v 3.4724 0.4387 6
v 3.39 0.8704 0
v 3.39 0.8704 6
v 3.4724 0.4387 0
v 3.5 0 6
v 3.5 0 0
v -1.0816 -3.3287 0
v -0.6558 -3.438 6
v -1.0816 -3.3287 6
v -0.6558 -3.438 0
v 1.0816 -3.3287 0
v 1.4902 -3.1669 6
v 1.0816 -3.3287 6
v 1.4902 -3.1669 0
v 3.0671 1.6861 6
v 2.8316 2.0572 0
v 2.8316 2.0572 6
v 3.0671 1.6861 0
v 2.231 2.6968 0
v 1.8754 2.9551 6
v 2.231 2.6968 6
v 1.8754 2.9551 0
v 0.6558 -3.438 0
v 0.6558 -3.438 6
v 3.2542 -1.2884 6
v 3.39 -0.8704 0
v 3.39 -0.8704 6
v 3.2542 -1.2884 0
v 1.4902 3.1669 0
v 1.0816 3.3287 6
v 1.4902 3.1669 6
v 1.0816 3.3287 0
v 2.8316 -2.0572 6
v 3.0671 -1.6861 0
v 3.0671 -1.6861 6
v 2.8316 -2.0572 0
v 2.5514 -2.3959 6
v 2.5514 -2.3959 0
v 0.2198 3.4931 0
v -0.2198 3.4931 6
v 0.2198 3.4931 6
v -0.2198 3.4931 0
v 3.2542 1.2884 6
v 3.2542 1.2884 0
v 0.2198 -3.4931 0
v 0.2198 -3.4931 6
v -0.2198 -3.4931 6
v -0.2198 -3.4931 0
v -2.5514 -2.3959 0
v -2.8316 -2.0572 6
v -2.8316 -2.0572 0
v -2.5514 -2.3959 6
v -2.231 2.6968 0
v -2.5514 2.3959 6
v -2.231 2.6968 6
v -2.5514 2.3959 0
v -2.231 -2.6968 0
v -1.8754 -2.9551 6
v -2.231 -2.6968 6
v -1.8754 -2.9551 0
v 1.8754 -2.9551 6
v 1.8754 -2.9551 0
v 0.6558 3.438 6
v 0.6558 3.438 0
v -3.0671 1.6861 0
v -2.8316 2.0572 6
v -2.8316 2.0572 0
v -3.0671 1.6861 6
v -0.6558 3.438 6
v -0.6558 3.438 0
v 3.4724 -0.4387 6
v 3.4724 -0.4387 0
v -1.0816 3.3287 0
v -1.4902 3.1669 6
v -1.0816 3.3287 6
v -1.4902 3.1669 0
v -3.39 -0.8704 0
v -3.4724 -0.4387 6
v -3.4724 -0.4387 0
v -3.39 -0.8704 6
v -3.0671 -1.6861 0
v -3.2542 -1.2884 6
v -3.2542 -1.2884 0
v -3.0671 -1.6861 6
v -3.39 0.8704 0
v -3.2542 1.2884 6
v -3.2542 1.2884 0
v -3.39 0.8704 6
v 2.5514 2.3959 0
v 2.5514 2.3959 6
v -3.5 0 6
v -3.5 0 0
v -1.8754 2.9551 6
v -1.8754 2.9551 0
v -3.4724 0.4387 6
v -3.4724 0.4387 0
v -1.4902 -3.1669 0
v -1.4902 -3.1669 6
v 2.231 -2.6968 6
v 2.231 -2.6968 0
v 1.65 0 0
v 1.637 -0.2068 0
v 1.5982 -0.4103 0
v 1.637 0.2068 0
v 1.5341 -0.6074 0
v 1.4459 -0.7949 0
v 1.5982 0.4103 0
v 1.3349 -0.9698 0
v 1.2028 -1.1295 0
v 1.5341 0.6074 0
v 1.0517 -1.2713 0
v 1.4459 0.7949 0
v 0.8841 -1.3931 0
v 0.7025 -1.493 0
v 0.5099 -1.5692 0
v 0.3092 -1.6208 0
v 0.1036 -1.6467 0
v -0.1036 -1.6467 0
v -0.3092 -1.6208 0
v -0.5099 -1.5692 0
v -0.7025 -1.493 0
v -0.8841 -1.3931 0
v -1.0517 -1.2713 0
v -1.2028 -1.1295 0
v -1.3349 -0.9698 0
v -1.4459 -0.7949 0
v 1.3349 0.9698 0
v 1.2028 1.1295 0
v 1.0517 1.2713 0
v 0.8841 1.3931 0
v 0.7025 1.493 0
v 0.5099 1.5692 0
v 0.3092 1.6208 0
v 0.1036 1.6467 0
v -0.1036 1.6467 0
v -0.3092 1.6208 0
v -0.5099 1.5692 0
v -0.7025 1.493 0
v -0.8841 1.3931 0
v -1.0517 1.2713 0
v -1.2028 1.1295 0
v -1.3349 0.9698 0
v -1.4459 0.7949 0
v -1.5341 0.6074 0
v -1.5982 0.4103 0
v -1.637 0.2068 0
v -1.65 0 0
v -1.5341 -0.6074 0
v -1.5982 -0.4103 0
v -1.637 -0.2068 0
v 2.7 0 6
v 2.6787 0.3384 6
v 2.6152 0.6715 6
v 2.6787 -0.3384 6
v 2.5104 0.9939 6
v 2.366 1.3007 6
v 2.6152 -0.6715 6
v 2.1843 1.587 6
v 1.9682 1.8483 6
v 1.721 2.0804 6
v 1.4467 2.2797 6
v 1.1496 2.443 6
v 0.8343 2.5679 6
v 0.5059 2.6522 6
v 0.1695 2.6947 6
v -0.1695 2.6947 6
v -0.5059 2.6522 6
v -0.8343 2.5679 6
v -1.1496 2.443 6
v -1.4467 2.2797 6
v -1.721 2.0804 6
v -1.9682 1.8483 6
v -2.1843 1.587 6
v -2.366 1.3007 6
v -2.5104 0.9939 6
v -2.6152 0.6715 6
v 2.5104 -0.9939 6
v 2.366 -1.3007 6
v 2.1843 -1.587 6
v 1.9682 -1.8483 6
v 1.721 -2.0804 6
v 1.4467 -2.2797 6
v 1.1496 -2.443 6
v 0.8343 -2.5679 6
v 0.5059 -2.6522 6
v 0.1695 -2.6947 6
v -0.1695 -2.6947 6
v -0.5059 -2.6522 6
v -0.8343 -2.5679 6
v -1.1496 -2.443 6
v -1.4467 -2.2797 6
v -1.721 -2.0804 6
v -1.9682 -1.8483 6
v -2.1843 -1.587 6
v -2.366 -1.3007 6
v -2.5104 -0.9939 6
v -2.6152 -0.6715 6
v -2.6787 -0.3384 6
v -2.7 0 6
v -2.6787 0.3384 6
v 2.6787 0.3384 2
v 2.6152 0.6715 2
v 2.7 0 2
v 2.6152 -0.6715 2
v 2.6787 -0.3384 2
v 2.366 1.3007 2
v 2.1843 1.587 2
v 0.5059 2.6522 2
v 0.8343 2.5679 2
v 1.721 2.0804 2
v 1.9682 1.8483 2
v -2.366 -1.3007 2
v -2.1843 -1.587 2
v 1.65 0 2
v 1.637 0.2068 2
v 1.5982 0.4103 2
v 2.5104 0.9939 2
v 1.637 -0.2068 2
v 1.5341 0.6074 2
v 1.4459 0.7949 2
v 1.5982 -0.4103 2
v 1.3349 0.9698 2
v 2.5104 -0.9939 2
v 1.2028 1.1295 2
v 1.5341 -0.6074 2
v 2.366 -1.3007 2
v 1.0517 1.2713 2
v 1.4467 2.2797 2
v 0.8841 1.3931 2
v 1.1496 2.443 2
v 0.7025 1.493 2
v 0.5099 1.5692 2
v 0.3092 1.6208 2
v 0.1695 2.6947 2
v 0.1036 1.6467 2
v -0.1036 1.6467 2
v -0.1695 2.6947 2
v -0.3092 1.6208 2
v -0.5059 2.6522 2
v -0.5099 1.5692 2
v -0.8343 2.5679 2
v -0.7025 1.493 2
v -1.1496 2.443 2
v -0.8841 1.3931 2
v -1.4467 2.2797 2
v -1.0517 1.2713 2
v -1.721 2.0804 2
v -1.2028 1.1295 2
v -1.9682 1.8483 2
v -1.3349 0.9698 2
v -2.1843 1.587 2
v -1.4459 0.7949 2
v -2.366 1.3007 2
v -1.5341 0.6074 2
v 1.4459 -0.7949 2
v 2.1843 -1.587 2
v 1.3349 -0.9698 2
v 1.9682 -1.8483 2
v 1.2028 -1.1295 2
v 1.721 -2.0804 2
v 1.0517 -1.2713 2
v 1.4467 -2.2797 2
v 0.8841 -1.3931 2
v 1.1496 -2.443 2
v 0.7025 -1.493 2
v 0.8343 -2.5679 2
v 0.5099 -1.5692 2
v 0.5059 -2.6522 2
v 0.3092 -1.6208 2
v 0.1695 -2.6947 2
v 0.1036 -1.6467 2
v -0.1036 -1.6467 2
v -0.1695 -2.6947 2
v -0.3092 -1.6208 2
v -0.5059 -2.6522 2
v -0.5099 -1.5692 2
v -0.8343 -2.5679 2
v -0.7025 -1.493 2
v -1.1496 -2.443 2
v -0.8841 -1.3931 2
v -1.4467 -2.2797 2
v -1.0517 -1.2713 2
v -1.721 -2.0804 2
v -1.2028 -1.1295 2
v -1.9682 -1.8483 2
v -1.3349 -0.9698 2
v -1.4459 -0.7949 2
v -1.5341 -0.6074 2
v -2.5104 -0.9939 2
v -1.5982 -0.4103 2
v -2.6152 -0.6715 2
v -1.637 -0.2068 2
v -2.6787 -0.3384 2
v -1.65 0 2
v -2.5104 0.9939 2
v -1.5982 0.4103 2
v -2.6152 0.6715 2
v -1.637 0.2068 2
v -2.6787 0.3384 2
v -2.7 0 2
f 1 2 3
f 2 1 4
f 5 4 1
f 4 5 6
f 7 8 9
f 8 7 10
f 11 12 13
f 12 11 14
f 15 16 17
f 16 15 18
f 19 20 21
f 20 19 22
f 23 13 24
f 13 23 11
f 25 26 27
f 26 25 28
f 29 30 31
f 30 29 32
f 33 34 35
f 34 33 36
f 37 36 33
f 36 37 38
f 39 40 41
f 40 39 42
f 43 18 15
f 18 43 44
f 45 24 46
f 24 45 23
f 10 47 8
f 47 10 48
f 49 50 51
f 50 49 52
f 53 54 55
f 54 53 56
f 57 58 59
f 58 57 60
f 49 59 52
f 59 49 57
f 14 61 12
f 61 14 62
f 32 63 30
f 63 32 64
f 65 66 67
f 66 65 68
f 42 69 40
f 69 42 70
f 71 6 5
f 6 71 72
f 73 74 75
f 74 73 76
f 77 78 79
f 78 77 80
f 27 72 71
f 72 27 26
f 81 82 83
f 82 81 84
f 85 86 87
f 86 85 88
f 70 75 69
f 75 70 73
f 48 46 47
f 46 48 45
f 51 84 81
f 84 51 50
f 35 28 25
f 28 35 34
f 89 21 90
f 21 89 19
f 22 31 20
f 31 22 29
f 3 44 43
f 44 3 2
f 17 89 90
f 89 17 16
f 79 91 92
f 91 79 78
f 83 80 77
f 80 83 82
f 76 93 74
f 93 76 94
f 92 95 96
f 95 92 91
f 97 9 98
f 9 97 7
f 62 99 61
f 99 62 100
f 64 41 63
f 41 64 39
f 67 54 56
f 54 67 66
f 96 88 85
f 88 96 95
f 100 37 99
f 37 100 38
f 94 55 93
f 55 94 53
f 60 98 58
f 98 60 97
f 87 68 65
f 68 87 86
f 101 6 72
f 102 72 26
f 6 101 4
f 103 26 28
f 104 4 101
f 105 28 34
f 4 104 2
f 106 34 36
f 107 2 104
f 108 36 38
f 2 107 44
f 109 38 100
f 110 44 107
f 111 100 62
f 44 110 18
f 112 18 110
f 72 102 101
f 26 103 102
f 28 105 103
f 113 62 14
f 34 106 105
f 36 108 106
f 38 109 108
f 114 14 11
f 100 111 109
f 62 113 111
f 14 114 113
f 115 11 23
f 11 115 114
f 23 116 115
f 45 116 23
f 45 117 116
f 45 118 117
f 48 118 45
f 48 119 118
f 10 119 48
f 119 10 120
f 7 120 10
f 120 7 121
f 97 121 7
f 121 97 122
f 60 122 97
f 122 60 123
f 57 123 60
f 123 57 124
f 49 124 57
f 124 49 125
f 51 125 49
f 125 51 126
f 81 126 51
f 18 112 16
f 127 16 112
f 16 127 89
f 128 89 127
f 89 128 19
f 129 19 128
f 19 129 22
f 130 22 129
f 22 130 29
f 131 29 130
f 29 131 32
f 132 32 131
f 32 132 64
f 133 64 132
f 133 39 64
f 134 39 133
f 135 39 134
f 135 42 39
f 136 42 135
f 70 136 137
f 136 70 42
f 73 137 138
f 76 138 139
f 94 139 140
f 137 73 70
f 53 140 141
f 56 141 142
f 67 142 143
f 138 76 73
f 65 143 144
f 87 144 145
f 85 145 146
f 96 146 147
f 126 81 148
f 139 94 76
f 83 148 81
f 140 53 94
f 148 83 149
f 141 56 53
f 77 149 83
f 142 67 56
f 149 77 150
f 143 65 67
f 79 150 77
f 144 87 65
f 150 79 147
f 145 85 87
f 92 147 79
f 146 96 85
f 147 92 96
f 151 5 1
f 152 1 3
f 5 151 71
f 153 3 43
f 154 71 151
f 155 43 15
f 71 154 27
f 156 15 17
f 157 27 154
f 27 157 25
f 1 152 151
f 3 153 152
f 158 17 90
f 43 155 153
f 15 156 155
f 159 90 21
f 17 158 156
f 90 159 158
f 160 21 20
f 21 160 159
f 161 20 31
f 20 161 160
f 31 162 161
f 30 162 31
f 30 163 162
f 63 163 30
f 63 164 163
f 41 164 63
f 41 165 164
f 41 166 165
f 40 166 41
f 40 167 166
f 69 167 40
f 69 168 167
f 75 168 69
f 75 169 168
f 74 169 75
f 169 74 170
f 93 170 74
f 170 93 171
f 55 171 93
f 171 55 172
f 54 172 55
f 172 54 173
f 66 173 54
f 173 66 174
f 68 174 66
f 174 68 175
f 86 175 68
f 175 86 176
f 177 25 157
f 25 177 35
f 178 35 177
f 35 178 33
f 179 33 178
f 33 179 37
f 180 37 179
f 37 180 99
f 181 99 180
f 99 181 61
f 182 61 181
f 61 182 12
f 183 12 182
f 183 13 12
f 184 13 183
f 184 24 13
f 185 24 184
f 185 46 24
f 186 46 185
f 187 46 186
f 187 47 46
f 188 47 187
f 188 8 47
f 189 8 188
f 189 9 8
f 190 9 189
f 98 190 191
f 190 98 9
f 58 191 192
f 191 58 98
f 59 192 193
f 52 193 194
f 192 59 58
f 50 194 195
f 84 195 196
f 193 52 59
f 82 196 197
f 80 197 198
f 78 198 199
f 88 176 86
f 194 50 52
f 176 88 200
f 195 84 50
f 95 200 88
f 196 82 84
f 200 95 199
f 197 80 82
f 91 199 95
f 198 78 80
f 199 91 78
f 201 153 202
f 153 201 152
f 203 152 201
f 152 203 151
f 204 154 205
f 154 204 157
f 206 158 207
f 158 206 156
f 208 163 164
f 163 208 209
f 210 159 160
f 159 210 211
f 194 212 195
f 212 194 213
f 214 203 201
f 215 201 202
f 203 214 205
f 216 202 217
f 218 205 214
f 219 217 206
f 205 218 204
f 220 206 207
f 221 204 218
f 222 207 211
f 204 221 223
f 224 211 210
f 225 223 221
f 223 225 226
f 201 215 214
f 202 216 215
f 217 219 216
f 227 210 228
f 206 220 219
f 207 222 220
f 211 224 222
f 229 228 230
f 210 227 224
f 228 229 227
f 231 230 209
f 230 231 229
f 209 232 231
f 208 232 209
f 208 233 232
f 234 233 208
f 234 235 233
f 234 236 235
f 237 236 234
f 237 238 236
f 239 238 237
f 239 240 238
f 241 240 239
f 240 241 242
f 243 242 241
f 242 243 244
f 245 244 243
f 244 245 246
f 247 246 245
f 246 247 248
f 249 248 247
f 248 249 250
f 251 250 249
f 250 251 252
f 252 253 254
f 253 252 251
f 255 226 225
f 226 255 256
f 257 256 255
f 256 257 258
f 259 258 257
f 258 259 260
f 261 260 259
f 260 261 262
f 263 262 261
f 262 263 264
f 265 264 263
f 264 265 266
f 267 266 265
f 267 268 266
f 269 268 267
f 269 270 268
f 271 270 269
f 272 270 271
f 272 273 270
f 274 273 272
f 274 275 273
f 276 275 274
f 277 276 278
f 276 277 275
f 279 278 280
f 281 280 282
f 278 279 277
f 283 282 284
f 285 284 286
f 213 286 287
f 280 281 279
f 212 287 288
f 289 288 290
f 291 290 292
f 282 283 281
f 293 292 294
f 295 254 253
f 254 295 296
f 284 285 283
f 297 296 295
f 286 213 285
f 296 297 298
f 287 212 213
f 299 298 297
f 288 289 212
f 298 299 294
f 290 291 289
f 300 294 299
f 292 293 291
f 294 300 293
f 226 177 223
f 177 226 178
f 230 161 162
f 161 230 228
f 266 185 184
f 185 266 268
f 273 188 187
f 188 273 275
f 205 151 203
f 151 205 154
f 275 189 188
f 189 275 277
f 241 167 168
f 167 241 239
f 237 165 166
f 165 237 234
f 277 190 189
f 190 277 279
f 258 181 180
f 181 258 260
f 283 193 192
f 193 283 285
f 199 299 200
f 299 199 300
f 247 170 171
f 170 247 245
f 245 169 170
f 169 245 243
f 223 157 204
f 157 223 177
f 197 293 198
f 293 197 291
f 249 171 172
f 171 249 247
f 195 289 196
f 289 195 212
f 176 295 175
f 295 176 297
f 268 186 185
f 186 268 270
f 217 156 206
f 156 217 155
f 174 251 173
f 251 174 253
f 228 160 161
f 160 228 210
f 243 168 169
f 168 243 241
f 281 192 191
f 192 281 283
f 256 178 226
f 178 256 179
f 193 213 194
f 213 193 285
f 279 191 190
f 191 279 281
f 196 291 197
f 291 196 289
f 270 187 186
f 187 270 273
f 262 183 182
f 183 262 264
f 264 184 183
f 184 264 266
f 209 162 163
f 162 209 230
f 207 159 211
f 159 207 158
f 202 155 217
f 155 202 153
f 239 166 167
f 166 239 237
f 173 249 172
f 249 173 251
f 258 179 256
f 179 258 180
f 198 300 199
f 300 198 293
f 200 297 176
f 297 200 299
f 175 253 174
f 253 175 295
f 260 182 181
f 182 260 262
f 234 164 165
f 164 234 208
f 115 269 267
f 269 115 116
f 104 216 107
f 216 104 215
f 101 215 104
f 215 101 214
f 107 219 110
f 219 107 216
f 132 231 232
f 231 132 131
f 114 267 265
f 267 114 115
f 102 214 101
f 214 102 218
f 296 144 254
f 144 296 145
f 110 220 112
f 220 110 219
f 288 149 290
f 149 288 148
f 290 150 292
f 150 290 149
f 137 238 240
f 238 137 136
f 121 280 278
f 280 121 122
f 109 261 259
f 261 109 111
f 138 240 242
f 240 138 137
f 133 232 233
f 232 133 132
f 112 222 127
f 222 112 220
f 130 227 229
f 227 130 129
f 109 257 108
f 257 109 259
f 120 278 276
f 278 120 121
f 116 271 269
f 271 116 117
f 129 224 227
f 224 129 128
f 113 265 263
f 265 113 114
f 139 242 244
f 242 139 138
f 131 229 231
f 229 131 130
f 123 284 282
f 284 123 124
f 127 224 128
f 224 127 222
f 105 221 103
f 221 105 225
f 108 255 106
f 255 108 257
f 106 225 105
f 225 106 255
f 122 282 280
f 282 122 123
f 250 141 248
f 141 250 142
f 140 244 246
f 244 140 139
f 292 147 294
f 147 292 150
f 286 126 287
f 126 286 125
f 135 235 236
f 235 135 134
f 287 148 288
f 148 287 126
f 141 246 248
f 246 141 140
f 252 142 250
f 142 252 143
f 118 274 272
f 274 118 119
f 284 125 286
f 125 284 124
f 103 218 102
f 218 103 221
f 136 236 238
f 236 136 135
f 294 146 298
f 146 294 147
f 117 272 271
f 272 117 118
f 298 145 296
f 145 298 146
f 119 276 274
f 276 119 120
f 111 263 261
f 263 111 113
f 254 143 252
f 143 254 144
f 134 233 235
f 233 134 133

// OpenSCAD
// adjust this depend of how precise your printer is
tolerance = 0.4;

// inner diameter of the spring guide, == your spring diameter
inner_dia = 5;

// diameter of the bold
bold_dia = 2.8;

// height of the spring guide
height = 6;

// wall thickness of the guide
thickness = 2;

$fn=50;

difference() {
    // define some value
    cylinder(height, d = inner_dia + thickness);
    translate([0, 0, thickness])
        cylinder(height - thickness, d = inner_dia + tolerance);
    cylinder(height, d = bold_dia + tolerance + 0.1);
}
